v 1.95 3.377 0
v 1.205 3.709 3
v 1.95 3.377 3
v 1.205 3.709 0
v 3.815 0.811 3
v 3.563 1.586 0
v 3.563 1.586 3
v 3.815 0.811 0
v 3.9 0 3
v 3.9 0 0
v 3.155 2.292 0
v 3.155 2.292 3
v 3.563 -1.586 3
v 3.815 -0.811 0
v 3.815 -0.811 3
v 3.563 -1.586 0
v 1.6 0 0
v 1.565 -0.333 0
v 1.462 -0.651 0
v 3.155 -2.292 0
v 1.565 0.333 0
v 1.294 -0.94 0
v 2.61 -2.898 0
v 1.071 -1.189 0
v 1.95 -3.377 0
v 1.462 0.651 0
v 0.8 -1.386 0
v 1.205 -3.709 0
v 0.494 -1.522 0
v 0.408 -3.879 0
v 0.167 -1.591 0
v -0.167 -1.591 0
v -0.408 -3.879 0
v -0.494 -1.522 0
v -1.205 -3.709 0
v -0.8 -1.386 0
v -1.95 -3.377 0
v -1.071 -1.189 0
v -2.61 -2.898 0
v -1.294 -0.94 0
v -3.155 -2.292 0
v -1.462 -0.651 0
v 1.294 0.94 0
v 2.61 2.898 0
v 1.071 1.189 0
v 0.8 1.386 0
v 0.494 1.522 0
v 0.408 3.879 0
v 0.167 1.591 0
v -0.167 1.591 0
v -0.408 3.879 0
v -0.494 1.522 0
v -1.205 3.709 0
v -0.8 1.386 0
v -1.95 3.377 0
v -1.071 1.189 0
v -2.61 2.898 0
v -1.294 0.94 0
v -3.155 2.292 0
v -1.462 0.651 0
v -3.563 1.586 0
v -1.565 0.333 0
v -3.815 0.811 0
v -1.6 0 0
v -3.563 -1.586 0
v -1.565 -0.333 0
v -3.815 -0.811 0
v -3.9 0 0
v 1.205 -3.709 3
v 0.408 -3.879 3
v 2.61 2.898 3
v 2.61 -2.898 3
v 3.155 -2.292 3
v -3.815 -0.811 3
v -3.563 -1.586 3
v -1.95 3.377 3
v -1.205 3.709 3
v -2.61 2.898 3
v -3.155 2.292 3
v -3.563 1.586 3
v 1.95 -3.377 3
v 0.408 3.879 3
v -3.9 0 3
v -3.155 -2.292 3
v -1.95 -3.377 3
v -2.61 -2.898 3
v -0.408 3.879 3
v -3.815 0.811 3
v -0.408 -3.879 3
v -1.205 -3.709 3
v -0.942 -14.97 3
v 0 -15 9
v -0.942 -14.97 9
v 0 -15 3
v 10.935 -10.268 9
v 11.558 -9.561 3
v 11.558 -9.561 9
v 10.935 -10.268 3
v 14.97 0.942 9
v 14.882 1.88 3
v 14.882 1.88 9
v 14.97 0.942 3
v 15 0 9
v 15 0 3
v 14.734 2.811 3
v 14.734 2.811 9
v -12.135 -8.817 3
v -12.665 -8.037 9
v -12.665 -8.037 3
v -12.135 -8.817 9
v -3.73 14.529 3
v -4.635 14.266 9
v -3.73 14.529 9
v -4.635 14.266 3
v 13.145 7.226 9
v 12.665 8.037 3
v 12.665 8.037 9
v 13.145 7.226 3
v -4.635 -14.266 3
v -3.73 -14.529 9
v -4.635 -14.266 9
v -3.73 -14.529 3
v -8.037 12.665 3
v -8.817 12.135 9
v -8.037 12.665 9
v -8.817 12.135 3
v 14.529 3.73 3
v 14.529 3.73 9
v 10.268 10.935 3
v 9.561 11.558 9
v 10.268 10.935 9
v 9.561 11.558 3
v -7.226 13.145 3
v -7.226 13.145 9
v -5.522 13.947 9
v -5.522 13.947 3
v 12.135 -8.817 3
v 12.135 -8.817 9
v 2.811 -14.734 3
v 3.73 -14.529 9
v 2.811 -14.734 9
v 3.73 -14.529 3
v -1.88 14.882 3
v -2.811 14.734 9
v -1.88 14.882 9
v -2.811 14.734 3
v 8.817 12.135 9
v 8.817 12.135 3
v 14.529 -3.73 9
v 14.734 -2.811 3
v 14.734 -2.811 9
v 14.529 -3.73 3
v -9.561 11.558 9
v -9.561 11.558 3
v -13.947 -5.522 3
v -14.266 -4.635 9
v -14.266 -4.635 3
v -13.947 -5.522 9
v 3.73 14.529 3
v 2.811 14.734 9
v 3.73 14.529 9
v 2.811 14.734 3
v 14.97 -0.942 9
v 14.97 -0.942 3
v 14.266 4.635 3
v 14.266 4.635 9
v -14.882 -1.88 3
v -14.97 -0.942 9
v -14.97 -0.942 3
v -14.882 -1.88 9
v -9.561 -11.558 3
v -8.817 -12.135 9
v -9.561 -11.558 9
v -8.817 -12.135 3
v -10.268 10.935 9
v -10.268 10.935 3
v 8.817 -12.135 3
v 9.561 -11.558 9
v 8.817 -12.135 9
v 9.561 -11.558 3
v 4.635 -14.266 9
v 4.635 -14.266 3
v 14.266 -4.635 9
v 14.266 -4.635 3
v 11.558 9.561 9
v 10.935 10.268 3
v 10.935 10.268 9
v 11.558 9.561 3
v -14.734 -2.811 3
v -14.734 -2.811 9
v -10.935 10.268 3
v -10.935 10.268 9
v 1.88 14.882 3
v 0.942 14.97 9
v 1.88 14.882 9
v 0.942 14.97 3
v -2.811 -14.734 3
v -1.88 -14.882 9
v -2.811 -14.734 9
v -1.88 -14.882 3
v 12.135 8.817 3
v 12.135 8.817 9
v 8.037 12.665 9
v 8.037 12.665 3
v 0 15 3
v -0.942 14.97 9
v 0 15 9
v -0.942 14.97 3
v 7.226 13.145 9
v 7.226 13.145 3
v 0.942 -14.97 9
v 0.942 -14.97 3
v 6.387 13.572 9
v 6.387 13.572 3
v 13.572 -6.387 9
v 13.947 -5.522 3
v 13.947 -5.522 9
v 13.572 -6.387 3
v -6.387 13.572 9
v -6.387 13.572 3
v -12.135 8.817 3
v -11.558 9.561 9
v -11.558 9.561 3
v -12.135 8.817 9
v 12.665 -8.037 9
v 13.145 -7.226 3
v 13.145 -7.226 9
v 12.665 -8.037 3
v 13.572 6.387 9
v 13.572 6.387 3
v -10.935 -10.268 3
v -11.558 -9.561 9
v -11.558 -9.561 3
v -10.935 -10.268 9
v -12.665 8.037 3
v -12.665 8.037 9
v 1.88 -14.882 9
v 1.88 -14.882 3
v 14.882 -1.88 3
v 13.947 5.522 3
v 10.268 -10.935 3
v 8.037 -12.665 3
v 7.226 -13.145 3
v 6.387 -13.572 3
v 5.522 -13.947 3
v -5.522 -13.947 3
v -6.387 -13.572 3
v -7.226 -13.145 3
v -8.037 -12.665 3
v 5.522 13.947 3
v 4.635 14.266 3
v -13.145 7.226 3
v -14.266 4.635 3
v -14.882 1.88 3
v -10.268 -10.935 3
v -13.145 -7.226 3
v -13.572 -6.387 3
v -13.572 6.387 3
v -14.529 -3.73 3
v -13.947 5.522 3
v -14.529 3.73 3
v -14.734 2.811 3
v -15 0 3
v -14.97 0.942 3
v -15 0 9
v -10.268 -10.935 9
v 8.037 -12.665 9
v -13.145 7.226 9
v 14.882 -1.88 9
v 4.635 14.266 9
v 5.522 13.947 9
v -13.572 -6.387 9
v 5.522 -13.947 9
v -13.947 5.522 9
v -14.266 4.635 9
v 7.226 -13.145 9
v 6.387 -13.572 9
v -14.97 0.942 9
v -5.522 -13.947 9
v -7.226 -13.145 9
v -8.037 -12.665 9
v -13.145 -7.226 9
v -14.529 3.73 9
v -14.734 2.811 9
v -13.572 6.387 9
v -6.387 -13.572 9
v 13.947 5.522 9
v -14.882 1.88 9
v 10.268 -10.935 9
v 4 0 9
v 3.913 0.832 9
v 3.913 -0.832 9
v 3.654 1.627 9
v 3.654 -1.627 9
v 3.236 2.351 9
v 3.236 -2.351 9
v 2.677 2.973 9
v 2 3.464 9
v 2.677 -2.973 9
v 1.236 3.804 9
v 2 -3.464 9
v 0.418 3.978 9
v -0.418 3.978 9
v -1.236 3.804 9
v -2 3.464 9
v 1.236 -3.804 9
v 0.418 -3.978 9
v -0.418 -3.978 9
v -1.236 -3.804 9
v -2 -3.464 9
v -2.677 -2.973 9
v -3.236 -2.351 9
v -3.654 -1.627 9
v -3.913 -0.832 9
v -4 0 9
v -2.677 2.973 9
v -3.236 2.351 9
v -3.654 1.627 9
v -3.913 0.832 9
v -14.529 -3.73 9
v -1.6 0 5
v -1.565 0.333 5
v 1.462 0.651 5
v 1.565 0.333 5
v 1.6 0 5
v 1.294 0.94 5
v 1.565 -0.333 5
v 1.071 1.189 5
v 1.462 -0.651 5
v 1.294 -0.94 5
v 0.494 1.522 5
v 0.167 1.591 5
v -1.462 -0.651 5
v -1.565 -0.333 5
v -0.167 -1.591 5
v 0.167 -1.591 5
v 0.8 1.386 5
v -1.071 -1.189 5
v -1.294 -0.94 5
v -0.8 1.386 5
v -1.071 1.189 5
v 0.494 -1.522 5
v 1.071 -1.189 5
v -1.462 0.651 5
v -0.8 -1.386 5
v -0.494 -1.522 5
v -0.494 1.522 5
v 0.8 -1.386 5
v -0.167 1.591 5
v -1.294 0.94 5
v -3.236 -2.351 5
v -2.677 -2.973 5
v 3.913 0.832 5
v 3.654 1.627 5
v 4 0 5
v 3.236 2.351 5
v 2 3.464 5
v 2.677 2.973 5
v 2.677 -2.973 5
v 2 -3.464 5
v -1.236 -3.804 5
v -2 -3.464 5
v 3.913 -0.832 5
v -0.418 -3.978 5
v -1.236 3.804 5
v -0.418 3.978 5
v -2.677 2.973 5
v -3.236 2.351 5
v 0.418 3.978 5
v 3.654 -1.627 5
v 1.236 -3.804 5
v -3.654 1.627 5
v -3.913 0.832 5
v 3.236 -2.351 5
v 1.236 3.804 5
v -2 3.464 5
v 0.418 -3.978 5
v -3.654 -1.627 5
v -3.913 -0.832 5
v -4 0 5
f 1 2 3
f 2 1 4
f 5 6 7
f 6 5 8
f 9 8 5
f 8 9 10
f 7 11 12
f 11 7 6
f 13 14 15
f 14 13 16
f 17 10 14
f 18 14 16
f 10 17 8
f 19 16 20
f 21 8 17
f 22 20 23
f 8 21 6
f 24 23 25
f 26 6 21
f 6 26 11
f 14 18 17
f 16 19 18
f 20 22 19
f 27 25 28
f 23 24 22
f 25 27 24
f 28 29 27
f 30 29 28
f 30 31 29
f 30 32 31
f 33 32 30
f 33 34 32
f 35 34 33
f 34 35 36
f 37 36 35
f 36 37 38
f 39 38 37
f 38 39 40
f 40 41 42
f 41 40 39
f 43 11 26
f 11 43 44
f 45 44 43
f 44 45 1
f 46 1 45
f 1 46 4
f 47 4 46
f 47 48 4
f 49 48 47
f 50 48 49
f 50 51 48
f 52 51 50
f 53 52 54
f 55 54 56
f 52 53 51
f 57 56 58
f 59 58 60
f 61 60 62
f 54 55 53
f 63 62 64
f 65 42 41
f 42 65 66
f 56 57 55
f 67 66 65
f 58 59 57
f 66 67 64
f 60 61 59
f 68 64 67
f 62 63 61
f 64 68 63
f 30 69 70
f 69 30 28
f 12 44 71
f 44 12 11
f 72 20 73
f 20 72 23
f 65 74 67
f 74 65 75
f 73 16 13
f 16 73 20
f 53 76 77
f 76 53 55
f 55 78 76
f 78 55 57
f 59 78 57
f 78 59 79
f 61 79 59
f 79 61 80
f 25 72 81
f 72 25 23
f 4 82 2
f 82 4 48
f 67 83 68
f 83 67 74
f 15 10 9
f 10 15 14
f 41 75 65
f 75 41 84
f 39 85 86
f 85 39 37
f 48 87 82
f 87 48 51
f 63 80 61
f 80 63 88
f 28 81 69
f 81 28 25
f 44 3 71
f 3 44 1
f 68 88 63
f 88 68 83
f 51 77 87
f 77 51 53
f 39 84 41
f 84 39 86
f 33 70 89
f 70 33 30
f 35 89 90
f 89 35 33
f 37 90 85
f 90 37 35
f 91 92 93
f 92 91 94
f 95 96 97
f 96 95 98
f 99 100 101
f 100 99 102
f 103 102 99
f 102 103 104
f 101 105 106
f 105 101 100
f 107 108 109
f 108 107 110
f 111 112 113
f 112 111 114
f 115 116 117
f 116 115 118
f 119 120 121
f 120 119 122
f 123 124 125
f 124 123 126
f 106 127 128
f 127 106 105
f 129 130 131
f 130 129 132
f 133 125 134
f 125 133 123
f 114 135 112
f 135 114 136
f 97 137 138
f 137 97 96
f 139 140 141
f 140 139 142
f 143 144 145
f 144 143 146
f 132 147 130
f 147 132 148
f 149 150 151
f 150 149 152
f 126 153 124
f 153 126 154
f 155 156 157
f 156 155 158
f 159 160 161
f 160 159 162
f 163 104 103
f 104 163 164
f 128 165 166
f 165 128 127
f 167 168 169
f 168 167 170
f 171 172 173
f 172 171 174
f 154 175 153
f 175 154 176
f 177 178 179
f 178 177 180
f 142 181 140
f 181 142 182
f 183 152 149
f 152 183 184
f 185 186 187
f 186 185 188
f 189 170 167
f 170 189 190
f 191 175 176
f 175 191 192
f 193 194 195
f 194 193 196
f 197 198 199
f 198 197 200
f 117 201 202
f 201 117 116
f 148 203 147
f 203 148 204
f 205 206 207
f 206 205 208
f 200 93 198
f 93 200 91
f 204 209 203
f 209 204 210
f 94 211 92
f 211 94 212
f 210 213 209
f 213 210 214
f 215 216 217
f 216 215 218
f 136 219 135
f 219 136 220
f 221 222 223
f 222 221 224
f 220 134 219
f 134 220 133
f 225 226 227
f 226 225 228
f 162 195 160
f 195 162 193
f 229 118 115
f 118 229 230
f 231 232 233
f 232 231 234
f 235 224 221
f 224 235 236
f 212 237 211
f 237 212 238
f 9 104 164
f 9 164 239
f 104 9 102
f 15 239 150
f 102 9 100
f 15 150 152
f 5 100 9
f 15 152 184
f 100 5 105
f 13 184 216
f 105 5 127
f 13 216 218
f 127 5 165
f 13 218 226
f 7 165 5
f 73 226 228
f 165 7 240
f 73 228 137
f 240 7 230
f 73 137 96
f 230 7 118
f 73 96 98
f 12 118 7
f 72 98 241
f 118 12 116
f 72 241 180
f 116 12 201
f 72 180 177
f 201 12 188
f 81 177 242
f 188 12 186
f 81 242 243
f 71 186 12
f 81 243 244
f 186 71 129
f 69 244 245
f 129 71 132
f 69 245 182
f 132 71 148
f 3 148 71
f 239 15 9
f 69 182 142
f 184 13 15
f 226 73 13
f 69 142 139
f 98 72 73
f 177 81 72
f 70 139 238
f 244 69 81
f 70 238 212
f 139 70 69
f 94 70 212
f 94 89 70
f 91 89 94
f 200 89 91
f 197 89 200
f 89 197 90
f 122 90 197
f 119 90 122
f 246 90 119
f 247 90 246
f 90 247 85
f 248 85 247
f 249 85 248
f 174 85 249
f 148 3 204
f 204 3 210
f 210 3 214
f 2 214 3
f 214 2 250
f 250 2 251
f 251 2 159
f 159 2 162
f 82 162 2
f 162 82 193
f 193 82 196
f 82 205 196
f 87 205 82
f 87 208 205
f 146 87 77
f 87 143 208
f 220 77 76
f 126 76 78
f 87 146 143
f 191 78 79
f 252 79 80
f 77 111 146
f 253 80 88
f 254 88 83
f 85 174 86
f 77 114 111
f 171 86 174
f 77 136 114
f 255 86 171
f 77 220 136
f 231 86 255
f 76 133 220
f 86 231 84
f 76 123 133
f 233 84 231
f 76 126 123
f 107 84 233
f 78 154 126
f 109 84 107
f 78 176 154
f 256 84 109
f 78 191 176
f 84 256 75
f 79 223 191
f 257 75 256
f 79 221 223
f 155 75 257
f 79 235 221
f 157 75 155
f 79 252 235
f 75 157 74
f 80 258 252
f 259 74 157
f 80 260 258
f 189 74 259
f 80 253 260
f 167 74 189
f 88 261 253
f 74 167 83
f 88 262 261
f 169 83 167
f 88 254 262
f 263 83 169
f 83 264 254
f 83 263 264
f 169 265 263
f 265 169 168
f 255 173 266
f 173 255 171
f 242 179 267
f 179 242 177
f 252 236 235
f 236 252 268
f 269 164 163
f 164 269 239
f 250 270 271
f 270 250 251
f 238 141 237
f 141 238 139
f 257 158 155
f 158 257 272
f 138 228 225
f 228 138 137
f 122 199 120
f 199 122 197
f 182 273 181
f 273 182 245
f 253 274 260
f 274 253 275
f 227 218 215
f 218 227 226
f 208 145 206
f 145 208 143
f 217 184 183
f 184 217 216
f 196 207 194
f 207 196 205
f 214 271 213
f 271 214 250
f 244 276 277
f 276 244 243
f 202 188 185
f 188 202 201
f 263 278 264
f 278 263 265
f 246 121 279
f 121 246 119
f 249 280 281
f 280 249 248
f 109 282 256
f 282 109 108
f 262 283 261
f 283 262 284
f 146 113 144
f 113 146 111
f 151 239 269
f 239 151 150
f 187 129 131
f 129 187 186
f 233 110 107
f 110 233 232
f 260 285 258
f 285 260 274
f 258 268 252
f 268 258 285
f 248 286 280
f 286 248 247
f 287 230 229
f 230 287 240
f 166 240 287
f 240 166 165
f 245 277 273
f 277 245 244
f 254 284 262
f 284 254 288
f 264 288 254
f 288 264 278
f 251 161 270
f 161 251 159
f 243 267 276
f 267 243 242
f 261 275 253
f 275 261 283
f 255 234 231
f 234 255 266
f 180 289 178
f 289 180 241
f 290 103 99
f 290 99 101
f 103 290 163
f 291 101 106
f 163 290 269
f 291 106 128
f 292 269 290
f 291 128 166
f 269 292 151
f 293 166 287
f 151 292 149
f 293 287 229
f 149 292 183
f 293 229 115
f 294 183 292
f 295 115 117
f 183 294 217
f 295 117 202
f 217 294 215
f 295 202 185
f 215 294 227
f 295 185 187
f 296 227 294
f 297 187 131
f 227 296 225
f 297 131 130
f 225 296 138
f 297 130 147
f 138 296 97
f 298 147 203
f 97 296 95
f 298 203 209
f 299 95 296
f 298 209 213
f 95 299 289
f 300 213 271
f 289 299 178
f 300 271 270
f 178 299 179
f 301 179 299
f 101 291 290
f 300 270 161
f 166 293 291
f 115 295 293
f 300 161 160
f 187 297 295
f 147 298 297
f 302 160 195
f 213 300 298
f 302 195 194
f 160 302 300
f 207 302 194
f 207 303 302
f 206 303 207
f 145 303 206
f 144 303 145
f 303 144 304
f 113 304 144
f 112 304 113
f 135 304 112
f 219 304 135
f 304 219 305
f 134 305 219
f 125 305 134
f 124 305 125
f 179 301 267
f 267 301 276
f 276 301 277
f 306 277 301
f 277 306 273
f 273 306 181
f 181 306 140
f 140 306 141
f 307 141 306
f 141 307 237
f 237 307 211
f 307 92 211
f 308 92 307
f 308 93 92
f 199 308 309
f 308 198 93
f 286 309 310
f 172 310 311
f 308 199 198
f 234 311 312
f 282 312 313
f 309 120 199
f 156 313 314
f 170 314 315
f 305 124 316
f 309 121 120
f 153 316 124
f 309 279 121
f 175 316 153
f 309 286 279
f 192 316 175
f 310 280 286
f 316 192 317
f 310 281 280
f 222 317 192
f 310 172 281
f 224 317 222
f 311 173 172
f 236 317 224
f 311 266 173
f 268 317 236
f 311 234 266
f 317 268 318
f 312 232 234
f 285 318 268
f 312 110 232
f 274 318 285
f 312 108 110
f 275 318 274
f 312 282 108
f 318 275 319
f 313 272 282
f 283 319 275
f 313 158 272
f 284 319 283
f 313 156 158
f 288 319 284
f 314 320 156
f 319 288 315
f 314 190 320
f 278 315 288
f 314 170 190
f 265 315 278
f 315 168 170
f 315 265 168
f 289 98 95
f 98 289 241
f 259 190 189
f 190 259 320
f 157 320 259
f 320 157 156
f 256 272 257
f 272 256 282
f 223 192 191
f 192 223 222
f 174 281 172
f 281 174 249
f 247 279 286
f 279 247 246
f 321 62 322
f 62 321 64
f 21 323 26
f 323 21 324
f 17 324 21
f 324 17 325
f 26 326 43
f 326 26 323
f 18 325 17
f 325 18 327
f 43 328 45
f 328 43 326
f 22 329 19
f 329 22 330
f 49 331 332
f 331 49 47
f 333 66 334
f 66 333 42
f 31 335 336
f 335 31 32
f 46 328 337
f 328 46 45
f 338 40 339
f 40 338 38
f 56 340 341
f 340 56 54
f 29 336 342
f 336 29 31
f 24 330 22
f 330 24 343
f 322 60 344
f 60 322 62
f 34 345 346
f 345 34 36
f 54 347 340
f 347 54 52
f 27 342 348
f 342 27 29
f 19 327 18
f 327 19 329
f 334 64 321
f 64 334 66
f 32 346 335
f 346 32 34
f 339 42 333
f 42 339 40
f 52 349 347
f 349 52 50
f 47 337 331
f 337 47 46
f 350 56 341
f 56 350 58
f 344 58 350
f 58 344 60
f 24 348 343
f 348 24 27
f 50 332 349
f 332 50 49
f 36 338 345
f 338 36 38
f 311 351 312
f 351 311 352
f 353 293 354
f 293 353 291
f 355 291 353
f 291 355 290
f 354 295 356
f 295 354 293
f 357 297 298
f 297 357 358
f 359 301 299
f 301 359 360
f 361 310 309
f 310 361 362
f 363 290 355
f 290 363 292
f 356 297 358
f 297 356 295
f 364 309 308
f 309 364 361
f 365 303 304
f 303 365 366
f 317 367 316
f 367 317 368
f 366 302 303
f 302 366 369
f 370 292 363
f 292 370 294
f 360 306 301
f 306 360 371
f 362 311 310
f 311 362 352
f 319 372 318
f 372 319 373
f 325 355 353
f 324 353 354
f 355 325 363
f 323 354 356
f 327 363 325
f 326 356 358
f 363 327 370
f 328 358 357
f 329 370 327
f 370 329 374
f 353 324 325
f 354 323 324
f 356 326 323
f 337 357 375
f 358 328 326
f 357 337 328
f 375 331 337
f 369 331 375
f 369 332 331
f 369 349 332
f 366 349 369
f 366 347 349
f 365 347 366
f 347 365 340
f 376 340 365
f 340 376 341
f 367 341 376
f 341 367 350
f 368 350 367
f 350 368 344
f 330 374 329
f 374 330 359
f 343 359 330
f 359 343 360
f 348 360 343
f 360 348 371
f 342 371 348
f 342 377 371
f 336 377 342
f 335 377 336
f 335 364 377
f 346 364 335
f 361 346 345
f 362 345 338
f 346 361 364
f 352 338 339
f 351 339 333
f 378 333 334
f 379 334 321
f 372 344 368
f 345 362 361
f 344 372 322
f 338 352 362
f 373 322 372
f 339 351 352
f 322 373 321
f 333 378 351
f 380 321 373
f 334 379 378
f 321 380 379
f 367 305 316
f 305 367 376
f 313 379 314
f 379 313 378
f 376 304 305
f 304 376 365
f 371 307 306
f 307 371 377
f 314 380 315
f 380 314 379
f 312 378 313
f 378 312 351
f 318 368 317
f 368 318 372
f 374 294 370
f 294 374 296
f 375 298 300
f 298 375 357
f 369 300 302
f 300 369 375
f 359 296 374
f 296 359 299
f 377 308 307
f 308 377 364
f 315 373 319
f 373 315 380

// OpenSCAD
difference() {
    union() {
        cylinder(h = 4, r = 3.9, $fn = 30);
        translate([0, 0, 3]) cylinder(h = 6, r = 15, $fn = 100);
    }
    cylinder(h = 10, r = 1.6, $fn = 30);
    translate([0, 0, 5]) cylinder(h = 6, r = 4, $fn = 30);
}
